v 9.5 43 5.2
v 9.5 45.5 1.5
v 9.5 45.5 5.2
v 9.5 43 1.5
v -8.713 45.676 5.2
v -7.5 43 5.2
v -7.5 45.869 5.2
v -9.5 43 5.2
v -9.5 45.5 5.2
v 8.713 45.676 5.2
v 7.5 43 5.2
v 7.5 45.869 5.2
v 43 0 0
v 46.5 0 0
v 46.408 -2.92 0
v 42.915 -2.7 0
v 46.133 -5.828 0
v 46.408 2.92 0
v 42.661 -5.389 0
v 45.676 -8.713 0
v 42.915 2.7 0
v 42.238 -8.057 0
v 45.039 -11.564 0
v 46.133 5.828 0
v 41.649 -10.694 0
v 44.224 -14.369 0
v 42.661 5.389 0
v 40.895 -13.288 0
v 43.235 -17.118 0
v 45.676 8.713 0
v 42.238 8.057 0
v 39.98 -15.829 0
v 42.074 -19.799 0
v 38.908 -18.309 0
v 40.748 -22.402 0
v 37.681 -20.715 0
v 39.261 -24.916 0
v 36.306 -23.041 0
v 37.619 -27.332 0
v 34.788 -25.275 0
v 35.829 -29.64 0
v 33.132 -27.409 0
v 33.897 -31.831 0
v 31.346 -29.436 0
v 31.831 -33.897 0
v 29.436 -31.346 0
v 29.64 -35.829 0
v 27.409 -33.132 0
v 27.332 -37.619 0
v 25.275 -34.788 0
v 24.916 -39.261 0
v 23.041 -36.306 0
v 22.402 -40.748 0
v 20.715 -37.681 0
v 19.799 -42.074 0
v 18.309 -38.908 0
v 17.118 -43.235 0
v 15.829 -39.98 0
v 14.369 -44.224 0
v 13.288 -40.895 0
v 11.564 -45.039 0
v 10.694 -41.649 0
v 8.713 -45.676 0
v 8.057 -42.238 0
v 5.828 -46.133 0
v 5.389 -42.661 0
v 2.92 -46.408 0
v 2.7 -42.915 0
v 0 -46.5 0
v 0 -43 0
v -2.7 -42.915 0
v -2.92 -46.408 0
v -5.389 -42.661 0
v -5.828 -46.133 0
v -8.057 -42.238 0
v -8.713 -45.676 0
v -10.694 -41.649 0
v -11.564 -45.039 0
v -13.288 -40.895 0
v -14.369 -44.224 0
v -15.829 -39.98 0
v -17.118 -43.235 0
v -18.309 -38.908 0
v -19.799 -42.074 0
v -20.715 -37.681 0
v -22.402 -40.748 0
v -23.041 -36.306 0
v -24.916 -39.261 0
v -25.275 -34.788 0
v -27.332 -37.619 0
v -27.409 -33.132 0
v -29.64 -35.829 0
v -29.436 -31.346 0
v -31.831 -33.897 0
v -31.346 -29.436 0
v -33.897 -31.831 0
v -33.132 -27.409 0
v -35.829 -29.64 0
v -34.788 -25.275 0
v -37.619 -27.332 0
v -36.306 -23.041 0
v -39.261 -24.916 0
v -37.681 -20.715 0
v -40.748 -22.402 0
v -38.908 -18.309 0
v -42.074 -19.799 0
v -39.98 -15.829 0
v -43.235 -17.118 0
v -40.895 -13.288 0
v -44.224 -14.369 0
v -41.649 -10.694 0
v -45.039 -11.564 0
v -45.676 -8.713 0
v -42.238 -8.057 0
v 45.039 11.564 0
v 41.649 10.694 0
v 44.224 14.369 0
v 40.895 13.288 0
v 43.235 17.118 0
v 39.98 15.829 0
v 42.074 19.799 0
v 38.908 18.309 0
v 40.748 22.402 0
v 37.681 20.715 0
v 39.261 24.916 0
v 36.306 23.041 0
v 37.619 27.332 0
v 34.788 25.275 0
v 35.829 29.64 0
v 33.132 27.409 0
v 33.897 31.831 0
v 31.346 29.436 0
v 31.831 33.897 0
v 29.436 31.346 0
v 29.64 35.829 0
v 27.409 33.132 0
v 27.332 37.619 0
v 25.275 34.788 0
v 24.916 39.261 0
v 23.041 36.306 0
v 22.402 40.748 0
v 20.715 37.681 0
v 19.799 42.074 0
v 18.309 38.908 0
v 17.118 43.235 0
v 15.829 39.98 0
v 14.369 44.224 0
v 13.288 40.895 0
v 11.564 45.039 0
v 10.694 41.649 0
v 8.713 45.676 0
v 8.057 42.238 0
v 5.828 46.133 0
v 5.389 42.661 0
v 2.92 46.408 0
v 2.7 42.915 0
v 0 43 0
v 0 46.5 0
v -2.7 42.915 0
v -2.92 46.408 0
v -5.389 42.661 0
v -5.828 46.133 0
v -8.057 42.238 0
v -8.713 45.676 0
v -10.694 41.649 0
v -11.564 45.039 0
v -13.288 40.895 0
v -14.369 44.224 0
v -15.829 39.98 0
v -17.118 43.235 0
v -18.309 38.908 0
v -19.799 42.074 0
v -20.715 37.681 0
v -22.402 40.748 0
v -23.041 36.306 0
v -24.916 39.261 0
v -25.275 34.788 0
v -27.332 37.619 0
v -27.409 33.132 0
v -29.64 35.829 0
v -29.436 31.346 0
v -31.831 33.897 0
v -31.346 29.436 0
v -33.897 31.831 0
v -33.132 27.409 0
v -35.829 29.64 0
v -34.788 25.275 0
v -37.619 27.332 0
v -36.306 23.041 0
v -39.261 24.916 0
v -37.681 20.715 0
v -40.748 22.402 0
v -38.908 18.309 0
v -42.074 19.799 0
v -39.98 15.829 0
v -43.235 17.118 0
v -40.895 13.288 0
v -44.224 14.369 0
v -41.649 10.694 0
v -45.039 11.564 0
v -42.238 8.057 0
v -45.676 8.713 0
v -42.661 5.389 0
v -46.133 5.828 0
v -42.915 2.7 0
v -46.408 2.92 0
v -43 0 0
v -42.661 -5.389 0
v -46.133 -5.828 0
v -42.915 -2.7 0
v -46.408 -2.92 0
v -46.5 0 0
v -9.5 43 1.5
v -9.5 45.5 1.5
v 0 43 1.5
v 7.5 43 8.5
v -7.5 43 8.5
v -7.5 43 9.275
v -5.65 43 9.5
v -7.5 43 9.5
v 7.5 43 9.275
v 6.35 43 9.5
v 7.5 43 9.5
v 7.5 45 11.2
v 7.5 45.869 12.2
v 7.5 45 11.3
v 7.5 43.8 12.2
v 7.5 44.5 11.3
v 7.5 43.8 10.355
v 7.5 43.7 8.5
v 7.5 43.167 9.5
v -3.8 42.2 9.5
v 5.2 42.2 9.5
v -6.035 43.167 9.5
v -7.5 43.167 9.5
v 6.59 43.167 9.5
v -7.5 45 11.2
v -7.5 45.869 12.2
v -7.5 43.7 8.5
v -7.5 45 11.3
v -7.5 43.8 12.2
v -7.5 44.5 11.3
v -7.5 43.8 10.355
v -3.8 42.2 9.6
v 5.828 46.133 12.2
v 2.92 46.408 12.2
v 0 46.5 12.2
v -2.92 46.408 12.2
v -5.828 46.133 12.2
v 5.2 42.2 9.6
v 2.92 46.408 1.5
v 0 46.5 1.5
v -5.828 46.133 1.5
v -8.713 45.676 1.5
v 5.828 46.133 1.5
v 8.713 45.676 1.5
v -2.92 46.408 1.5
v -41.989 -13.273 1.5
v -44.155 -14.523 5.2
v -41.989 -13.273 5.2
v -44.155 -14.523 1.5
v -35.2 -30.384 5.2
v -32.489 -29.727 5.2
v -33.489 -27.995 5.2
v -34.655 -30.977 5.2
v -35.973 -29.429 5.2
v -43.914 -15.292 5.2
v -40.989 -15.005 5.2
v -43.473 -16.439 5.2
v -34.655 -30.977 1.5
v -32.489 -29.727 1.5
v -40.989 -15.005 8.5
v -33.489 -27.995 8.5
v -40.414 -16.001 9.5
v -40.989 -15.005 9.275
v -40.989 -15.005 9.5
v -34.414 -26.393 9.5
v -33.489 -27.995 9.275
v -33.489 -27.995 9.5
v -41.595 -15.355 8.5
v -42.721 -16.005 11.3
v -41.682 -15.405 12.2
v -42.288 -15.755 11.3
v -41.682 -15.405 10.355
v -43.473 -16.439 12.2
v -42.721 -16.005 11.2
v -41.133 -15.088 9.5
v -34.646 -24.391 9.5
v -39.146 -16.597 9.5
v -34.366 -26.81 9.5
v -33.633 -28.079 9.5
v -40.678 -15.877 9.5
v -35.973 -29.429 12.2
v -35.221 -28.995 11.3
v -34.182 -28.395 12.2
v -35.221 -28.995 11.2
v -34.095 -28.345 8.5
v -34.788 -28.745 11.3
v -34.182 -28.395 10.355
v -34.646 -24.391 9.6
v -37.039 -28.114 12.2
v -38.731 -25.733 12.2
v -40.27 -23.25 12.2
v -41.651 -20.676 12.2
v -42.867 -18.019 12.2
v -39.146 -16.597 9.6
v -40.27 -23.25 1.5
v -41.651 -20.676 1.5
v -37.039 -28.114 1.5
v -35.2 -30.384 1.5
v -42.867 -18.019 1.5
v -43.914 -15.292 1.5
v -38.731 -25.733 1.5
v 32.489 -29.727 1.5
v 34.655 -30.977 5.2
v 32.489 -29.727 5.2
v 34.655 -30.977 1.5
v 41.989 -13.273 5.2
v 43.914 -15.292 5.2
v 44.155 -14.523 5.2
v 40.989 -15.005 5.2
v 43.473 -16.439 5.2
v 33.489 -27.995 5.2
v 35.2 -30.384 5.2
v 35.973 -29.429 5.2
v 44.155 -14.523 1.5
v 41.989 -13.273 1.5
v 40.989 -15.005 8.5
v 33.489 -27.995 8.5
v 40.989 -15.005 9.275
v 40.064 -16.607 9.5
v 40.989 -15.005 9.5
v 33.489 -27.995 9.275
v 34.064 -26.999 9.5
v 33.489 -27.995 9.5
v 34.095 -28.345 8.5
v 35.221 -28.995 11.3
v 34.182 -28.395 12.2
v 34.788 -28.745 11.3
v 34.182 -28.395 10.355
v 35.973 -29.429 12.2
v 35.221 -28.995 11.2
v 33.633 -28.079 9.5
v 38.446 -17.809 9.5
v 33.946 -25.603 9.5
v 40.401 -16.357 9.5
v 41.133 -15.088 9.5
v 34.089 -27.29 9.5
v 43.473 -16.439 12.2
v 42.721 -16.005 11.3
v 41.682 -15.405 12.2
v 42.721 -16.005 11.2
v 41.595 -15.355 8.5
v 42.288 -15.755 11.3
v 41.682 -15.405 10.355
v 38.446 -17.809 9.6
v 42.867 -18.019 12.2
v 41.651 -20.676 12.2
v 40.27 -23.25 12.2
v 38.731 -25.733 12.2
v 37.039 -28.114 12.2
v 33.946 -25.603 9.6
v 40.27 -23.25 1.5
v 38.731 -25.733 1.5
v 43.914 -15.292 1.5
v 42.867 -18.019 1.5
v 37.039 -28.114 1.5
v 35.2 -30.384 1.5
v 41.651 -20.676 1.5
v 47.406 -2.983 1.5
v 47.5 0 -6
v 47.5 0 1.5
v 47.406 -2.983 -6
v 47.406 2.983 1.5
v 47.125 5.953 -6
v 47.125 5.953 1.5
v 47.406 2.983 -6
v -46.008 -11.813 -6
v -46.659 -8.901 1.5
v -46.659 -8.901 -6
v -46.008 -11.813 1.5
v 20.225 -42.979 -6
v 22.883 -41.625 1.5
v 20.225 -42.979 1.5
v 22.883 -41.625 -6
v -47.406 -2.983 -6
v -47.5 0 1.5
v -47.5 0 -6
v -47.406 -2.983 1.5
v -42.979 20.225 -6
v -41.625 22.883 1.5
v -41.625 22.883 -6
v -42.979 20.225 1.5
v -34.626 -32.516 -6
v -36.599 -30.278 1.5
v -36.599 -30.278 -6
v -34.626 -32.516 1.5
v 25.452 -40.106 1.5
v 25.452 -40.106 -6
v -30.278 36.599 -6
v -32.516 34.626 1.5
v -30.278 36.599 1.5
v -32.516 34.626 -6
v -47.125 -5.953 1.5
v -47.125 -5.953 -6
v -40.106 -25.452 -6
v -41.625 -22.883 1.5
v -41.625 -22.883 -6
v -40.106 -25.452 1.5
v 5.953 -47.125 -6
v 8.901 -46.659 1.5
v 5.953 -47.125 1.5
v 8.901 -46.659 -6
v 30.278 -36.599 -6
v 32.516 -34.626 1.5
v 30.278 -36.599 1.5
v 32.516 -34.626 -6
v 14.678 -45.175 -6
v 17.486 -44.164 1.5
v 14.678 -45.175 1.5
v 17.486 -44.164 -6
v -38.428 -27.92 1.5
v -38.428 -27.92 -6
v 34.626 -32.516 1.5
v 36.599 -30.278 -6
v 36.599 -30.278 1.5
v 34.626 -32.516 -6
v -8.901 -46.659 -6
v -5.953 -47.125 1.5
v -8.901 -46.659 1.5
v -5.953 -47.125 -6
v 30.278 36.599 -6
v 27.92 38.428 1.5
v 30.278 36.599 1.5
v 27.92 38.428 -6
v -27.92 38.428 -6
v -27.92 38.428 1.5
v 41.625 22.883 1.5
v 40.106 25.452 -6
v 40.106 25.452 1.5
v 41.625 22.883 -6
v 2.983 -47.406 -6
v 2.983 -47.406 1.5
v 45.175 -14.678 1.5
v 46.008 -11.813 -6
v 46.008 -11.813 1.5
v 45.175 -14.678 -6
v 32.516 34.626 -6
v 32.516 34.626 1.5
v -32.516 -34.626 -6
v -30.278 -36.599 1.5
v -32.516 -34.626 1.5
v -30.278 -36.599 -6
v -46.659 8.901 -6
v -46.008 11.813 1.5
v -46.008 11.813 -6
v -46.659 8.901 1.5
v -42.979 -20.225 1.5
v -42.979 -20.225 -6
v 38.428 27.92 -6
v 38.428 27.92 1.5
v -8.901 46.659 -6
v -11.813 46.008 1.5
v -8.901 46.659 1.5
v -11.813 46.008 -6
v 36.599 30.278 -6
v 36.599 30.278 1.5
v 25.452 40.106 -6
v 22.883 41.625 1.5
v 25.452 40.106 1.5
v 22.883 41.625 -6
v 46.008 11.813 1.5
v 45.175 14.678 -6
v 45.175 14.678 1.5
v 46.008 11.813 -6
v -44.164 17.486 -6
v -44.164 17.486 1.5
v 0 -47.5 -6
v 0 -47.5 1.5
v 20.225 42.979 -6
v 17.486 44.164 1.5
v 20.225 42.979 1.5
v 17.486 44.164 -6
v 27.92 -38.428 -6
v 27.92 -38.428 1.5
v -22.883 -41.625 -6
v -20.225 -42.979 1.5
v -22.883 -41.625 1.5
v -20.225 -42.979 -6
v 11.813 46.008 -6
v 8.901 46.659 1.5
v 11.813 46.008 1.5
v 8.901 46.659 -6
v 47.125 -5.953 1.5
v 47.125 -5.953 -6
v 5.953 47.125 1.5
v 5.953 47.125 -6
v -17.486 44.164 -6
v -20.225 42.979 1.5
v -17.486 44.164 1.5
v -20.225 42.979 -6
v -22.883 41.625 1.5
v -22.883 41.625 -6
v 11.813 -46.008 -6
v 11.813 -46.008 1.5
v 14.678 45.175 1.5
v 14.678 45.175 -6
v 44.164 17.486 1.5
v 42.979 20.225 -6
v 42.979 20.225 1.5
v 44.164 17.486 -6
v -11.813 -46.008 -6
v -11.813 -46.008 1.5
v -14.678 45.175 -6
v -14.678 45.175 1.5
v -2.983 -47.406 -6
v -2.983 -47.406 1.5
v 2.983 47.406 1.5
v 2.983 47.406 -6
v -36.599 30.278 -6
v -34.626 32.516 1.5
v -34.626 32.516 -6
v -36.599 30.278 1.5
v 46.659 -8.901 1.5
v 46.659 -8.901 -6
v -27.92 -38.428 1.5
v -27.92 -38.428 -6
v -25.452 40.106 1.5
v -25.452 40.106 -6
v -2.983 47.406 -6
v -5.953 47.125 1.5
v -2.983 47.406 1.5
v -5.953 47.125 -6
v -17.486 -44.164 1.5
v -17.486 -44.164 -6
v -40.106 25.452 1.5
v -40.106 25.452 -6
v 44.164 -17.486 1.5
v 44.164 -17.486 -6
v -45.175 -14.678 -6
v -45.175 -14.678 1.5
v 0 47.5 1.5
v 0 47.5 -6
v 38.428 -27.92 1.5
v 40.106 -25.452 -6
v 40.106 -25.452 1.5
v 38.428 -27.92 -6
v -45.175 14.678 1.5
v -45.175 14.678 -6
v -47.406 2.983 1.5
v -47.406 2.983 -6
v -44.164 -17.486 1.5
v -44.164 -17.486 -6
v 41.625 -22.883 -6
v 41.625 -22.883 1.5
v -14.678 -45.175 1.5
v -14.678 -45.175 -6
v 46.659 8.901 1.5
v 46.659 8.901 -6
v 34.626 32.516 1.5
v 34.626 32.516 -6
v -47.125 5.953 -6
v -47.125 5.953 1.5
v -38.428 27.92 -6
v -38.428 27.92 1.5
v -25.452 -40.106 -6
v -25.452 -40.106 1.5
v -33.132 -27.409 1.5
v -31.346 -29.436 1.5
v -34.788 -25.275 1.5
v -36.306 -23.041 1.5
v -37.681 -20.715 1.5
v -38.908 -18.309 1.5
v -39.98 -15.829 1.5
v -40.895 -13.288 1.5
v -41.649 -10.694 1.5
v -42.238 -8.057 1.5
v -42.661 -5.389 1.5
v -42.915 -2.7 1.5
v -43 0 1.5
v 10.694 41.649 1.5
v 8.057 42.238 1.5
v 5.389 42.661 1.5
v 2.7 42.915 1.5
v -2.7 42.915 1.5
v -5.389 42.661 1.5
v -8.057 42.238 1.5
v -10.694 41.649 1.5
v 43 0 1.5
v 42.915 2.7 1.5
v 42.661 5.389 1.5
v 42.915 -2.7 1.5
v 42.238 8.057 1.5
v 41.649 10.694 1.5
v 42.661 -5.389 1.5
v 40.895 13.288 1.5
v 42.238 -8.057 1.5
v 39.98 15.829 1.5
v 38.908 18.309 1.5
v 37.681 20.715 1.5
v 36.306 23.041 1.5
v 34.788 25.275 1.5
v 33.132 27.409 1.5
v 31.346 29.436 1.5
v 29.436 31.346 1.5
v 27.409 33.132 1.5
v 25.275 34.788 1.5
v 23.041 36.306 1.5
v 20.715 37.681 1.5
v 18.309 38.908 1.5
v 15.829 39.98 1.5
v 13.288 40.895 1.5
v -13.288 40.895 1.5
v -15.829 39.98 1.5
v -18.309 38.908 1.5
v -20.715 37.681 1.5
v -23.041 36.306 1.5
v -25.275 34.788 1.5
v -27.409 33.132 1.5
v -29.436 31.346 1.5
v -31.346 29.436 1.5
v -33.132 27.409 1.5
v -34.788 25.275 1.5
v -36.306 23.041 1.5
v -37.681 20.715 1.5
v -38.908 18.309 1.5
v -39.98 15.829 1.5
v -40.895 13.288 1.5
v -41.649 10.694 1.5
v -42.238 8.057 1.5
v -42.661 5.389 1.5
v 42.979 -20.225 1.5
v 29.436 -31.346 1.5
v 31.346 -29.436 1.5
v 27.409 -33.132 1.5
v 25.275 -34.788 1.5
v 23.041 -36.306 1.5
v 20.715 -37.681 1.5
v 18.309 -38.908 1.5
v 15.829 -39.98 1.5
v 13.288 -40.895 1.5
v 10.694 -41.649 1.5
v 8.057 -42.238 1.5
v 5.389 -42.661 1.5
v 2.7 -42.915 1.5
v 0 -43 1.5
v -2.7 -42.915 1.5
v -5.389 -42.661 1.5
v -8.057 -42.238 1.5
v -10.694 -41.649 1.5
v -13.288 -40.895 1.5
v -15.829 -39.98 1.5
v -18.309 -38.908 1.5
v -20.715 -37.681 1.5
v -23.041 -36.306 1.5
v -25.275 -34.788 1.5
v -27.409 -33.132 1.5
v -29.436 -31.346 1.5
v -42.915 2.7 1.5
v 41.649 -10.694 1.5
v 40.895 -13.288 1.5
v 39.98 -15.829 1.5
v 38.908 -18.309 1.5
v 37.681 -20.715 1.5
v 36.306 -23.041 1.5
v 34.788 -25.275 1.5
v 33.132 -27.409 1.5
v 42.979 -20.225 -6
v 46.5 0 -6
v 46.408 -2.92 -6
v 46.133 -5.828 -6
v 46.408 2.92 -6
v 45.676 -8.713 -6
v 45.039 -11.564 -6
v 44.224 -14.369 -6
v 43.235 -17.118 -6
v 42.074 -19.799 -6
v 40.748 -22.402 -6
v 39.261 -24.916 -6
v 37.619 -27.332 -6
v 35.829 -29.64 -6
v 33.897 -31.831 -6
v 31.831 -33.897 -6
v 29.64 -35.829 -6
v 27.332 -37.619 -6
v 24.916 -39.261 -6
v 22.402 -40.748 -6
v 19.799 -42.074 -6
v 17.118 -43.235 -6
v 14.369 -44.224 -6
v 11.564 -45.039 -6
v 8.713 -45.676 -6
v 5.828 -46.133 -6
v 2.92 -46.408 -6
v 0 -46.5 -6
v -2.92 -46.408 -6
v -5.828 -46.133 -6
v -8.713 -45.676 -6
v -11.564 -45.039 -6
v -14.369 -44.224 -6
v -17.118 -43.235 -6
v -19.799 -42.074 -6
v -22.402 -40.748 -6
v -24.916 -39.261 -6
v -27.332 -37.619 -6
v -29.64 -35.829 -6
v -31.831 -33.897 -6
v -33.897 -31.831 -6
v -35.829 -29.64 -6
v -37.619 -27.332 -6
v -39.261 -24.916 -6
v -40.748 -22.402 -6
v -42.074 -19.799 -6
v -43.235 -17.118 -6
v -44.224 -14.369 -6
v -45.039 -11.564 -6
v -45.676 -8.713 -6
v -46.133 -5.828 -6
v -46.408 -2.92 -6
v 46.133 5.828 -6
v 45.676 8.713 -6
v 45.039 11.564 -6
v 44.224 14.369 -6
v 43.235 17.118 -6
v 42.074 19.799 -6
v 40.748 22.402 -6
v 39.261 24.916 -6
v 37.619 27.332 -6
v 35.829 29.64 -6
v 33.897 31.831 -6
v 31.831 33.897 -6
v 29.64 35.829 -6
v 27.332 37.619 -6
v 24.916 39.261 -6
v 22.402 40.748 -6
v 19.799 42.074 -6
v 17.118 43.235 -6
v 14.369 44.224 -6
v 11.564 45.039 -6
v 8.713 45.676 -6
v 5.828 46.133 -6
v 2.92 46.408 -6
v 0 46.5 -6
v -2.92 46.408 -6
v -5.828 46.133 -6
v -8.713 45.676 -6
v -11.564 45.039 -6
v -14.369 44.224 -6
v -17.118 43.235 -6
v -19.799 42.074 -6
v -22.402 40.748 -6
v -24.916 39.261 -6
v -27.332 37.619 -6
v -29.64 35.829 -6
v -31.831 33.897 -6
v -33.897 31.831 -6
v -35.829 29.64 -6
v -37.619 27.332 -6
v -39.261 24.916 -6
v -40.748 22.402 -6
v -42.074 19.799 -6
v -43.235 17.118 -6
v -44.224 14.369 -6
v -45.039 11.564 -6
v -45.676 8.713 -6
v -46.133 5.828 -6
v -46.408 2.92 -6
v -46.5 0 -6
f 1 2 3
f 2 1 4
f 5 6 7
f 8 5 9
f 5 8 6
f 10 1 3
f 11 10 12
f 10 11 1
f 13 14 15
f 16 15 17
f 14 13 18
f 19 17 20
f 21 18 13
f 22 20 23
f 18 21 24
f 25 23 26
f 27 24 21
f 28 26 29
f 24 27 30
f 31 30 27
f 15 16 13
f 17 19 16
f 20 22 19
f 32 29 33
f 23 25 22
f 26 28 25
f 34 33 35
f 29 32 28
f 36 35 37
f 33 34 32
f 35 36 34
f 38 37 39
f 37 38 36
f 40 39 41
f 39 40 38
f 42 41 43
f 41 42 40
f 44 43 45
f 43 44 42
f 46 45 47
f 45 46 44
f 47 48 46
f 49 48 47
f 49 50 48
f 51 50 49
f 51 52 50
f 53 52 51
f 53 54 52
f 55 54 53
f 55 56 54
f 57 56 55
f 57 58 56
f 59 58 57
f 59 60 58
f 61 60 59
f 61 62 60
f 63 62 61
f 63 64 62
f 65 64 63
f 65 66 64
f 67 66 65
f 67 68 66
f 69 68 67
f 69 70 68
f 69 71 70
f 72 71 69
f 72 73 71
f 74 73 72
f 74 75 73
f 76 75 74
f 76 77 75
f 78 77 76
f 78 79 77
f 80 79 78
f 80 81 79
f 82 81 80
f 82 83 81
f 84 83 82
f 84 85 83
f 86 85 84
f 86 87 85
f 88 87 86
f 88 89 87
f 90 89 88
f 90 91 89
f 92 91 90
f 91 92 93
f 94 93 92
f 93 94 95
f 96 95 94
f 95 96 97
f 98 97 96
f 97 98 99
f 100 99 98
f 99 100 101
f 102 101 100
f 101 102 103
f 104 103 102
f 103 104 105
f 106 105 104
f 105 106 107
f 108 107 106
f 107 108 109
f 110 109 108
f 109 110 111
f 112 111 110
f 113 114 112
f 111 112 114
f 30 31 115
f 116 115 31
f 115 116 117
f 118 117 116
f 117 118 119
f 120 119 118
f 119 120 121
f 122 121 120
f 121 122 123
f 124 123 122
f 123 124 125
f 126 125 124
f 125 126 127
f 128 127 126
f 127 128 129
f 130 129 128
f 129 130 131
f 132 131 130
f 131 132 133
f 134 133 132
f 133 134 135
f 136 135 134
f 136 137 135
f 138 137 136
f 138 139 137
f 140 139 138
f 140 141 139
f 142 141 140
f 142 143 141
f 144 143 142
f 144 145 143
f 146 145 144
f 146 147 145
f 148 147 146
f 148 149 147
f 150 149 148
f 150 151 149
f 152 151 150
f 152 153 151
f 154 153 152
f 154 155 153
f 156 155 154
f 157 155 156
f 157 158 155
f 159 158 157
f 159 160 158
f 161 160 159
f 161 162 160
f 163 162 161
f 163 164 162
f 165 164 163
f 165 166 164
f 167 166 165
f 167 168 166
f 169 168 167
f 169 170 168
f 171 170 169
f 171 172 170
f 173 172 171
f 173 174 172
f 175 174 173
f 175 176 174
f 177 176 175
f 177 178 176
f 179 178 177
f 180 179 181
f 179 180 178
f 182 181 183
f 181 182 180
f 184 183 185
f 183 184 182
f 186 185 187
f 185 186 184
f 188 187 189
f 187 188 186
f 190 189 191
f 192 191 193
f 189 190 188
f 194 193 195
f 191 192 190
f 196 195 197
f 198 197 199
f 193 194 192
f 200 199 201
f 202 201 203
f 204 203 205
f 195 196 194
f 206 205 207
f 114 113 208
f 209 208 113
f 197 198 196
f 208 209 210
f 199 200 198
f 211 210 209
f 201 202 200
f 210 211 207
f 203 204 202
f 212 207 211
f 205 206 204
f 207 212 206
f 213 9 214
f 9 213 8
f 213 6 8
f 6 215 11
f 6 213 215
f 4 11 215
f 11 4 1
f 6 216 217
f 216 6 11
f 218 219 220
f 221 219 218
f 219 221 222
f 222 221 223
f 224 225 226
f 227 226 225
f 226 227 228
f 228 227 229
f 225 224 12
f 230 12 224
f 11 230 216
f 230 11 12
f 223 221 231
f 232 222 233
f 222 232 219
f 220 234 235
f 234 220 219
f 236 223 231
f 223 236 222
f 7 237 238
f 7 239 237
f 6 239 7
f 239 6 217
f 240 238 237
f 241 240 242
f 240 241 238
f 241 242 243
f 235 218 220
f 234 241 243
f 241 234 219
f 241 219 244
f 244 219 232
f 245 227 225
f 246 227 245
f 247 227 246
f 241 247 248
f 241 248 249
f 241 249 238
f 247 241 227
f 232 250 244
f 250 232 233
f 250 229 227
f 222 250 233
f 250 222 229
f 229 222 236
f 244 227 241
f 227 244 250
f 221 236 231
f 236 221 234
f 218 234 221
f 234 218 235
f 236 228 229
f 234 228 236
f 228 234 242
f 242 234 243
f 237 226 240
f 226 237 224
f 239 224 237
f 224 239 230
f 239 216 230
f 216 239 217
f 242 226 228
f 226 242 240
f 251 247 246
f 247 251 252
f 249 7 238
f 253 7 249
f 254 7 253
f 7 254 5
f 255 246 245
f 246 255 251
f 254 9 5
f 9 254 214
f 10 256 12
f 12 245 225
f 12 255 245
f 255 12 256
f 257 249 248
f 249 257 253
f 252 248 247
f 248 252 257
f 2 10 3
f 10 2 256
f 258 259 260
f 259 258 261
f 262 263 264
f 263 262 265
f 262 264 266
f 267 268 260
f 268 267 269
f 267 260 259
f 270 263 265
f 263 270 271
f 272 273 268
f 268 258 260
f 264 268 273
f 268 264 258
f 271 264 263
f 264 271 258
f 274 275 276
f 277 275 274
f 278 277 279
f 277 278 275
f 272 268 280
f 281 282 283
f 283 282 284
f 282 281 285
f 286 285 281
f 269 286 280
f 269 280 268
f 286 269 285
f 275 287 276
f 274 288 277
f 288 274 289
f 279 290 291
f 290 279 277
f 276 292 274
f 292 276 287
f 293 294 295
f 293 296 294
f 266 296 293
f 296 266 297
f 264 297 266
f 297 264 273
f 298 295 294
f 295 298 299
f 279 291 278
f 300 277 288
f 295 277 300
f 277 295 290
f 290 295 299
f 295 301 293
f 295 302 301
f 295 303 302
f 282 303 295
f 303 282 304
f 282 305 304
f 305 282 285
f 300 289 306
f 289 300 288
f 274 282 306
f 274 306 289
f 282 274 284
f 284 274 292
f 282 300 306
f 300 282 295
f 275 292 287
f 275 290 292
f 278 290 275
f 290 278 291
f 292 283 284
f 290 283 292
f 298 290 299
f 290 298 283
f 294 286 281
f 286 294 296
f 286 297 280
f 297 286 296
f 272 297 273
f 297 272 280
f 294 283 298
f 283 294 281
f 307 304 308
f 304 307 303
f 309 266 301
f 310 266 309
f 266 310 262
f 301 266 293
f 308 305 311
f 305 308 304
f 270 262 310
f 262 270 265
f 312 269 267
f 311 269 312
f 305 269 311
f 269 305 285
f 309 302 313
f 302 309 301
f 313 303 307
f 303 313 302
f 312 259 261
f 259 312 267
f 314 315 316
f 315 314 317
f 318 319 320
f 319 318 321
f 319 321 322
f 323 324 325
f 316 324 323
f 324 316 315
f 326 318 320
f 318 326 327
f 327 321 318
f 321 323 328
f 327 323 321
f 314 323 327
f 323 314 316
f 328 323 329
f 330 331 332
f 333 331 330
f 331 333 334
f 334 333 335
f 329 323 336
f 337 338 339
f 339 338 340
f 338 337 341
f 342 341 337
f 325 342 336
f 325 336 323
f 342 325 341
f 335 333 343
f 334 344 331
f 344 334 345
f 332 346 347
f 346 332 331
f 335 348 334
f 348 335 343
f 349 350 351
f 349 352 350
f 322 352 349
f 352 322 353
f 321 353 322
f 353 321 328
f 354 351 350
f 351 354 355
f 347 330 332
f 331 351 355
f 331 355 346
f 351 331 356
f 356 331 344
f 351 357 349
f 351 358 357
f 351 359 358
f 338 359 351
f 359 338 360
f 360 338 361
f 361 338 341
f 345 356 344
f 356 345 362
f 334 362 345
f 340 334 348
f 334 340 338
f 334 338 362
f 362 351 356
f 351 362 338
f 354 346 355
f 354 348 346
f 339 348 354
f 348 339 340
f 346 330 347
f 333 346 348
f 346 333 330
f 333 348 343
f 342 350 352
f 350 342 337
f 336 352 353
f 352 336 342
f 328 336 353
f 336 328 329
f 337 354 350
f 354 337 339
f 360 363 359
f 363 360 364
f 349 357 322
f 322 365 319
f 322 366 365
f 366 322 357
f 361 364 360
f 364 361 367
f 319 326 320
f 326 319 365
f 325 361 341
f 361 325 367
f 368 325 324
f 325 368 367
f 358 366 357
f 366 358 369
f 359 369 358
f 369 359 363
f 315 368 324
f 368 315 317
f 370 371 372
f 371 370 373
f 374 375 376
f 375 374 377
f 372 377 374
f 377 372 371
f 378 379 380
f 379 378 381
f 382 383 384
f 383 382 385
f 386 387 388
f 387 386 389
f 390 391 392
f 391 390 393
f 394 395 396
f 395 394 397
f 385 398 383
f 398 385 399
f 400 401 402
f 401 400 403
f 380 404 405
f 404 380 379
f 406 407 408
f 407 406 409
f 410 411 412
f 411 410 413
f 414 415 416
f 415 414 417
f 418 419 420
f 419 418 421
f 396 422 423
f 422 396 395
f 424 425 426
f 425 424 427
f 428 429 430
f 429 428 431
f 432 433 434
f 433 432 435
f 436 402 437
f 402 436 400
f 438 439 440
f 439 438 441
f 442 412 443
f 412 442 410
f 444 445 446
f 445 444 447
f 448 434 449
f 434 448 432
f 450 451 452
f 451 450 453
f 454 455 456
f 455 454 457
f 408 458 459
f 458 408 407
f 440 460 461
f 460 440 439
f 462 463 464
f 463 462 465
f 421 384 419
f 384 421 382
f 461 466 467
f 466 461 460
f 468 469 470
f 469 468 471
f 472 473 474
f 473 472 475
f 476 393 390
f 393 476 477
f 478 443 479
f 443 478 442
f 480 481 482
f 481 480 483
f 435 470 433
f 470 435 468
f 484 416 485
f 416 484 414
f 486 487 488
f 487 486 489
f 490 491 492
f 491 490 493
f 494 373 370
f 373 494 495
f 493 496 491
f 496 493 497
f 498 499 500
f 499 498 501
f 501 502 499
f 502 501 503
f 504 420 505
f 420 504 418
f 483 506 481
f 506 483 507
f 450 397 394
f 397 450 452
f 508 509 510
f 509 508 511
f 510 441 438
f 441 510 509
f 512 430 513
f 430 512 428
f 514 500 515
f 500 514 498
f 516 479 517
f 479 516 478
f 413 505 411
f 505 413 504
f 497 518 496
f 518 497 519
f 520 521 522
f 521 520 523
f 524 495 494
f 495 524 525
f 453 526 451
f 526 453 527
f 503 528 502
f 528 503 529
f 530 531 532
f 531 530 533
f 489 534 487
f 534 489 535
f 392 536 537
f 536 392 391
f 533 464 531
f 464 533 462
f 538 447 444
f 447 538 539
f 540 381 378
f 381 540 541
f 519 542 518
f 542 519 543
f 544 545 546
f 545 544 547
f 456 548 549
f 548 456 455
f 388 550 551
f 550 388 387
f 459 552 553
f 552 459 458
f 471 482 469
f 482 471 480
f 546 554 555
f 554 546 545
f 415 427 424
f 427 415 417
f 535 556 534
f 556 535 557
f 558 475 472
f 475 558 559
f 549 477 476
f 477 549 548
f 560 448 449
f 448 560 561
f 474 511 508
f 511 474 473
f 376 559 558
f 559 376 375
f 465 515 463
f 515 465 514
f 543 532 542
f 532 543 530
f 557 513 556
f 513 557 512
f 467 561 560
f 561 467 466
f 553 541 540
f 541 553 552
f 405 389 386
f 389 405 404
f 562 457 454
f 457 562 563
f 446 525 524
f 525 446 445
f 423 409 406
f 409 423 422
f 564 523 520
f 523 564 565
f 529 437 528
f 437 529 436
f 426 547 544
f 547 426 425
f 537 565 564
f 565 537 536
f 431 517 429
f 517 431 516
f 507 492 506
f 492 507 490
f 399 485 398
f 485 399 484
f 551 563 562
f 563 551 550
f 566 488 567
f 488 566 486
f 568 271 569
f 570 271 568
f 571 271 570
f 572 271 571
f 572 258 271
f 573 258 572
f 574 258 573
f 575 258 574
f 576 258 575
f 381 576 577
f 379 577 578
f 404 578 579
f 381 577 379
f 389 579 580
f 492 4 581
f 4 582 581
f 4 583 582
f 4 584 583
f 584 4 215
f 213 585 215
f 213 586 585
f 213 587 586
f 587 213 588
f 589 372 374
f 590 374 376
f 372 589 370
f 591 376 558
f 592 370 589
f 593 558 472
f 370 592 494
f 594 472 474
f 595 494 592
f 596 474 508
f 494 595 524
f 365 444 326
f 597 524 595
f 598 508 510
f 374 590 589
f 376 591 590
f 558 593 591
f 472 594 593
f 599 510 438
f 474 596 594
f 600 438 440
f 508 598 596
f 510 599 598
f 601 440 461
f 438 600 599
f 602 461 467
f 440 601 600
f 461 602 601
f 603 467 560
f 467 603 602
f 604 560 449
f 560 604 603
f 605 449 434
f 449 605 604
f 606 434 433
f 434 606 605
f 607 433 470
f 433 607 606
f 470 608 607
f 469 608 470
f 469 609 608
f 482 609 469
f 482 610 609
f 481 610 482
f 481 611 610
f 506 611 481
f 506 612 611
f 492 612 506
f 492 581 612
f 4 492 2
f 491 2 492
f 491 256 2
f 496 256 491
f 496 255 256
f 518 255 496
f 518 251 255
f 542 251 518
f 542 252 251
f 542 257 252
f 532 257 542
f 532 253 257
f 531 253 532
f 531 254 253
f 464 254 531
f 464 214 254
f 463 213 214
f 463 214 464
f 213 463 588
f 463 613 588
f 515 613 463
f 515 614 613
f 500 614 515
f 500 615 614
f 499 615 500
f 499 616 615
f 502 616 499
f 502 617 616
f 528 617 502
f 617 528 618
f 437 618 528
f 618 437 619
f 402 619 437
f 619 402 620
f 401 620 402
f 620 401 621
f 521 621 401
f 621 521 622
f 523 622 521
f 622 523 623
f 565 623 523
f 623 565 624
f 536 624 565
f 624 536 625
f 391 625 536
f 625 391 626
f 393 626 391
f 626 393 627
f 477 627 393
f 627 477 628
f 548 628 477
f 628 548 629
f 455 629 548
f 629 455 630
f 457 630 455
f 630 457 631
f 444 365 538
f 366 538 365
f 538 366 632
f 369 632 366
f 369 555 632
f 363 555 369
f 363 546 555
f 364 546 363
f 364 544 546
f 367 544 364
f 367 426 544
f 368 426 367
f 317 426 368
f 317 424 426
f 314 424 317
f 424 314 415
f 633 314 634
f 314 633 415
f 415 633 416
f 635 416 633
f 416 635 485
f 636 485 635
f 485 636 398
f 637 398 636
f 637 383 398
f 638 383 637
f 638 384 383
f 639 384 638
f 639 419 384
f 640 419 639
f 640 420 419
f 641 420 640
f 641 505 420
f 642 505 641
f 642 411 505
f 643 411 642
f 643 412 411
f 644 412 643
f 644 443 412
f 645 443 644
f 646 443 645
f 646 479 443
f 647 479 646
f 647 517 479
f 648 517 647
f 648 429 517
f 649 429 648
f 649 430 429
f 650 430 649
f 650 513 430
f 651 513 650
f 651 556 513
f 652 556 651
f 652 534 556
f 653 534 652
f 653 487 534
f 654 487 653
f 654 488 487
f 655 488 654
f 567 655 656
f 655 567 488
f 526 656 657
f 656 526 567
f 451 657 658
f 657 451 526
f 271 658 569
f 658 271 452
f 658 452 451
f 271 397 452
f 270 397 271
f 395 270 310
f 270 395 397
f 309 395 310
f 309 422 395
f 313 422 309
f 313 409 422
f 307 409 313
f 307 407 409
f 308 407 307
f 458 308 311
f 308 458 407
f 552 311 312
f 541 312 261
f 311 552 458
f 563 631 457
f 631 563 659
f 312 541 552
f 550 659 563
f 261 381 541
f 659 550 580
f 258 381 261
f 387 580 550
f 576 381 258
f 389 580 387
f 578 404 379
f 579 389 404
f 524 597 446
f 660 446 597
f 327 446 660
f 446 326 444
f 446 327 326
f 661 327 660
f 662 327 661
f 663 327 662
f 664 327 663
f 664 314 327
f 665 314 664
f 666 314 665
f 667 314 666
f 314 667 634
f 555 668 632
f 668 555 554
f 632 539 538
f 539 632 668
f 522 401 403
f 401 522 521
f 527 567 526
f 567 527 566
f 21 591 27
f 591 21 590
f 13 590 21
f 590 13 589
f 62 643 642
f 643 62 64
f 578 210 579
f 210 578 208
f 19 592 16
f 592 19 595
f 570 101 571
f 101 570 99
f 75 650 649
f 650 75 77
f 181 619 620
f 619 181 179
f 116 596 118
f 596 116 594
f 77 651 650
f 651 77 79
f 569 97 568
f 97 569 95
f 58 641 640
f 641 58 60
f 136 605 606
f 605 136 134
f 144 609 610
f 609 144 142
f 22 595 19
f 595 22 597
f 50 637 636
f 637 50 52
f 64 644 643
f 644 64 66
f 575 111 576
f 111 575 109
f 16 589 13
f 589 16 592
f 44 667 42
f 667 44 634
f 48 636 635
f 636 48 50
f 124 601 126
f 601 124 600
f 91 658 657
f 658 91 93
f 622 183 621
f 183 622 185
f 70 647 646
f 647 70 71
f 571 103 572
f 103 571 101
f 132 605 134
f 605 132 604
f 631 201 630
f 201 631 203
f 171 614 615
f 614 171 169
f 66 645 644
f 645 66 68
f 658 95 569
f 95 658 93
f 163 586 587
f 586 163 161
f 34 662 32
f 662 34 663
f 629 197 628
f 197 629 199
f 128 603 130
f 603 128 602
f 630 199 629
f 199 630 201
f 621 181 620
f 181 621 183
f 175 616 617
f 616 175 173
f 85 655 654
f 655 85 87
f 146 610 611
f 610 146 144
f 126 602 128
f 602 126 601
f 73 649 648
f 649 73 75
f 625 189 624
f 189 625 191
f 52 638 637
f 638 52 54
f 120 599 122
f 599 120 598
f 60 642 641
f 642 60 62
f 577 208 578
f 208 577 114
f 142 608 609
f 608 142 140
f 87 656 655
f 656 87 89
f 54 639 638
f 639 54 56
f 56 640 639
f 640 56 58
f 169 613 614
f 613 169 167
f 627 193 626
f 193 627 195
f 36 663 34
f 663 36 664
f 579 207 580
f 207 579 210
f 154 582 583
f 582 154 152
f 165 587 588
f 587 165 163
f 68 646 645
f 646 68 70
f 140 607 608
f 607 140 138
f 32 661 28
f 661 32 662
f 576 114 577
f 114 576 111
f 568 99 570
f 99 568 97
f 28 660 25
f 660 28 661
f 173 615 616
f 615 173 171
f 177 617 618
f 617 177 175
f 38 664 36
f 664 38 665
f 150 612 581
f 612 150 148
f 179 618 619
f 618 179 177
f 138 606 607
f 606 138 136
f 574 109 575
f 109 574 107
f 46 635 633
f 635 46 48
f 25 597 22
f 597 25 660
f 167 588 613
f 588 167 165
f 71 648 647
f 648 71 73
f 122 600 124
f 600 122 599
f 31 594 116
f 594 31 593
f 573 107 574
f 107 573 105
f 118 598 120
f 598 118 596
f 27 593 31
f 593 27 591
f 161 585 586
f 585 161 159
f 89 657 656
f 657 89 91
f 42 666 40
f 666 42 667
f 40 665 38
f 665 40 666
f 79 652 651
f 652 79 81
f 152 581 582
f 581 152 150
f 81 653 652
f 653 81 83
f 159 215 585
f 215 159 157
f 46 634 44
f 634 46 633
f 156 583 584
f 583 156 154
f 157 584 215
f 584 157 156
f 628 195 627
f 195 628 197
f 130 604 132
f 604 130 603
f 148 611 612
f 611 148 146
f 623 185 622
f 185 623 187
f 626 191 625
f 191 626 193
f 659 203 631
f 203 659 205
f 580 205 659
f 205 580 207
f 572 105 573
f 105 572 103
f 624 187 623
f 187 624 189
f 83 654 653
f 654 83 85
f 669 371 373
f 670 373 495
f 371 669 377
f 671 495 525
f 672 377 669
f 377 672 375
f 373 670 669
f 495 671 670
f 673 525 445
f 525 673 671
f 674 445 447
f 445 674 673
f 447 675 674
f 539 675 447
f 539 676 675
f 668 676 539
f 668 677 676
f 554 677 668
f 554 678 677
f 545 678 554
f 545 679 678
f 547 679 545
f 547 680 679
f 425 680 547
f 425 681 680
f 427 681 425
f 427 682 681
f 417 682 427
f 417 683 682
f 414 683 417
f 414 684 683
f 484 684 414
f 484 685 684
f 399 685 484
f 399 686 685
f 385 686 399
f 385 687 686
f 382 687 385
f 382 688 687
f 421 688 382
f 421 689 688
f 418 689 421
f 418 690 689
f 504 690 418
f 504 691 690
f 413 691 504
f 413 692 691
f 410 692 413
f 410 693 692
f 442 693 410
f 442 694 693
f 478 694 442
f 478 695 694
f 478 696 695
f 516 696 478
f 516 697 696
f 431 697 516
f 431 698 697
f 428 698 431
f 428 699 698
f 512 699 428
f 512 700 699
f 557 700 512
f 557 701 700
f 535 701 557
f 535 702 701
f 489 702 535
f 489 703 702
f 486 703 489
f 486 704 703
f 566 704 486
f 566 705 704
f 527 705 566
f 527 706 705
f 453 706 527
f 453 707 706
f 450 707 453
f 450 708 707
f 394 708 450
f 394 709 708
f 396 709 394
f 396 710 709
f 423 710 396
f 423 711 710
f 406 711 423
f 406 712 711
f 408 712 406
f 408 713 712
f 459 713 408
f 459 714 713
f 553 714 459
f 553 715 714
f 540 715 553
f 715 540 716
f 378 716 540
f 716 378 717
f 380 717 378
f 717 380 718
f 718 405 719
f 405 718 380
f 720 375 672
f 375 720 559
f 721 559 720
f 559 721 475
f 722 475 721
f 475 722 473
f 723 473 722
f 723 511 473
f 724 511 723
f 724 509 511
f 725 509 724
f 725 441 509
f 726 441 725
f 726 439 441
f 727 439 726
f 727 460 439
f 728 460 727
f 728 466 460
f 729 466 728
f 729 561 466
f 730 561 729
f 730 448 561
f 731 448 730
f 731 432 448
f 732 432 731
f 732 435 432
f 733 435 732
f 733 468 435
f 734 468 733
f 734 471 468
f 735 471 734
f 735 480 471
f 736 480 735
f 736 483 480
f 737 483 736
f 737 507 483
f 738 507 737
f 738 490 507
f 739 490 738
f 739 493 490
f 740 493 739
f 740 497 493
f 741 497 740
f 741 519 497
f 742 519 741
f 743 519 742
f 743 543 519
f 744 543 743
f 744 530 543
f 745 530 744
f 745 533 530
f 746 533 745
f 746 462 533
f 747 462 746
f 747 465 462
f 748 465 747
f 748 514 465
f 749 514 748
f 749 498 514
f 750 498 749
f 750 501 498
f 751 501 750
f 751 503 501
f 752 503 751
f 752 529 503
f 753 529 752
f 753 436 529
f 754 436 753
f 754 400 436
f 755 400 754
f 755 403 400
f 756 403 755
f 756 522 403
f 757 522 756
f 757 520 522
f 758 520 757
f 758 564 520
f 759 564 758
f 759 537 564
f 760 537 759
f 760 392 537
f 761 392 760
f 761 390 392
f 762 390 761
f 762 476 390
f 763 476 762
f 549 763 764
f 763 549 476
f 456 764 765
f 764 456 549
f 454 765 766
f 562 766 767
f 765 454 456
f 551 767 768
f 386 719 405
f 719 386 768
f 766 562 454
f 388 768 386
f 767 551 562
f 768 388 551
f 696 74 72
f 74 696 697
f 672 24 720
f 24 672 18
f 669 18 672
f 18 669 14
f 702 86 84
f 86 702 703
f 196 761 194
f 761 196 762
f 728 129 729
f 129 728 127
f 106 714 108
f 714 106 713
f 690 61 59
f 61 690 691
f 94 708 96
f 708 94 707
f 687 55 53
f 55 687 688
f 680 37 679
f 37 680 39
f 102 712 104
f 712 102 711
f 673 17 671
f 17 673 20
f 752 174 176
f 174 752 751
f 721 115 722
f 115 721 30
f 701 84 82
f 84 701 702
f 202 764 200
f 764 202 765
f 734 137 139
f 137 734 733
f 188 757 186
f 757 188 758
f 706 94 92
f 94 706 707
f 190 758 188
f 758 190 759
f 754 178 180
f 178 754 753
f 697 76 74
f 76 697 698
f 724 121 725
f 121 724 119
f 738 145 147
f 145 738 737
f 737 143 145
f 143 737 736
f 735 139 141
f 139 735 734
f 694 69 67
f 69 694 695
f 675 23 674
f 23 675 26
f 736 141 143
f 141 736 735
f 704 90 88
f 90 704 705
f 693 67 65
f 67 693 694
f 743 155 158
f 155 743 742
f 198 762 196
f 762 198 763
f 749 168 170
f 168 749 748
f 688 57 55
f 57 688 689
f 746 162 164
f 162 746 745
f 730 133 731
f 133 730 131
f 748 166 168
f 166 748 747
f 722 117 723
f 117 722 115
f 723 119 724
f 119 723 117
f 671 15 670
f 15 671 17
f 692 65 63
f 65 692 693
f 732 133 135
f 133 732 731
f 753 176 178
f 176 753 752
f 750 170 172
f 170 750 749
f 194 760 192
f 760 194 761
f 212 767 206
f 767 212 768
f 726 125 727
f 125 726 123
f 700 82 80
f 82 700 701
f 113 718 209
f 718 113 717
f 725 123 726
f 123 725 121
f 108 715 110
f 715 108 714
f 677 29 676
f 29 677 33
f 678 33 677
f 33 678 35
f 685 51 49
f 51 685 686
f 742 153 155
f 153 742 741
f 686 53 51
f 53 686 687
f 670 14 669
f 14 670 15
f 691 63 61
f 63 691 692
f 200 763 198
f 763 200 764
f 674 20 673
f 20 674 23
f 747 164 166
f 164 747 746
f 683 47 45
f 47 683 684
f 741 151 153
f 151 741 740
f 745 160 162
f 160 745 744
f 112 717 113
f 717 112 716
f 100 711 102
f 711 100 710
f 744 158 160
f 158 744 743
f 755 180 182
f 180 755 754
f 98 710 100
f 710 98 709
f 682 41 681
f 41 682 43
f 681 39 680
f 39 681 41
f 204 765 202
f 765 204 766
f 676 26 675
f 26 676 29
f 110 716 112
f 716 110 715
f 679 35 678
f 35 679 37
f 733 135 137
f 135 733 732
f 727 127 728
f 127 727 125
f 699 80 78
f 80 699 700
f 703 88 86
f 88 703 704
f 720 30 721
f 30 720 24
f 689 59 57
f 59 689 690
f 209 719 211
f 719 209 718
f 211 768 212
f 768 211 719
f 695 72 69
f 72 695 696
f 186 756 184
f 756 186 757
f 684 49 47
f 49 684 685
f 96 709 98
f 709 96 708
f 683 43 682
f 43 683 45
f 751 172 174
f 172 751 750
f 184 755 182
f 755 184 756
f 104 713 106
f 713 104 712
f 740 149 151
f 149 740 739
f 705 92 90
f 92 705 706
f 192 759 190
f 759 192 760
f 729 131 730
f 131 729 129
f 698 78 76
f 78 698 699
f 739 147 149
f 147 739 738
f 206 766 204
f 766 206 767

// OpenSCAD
// file: secteur.scad
//secteur


module secteur(h,d,alpha,pas=2)
{
    c=sin(pas)*d/2;
    
    hull()
    {
        cube([.1,.1,h]);
        for(i=[0:pas:alpha])
        {
            rotate([0,0,i+pas/2]) translate([d/2-.1,-c/2,0]) cube([.1,c,h]);
        }
    }
}
// main file
// lampe V4
include <secteur.scad>

di=95.6;  // diametre intérieur tube

hf=12; // hauteur bas

hb=7;  // hauteur bouton base carte

dc=81.5;  // diametre carte

lp=15;  // largeur pied support vitre
xp=3.5;   // epaisseur pied support vitre
dp=86+2*xp;  // diametre exterieur pieds

hclip=2.7;
hp=9.5+hclip;  // hauteur pied support vitre


dv=95;  // diametre vitre
epv=1;  // epaisseur bord transversal vitre
epvf=1.5;  // epaisseur fond suport vitre vitre
hv=6;

jeu=.5;

alphaUsb=90+20-44;

//translate([0,0,hf+hb])  rotate([180,0,-22]) 
haut();

//projection(false) bas();
//translate([0,0,12]) 
//projection() 
//decoupeFond();


module haut()
{

    //  pied
    for(i=[0:1:3])
    {
        rotate([0,0,i*360/3]) intersection()
        {
            cylinder(hp,dp/2,dp/2,$fn=100);

            difference()
            {
                union()
                {
                    #translate([-lp/2-2,dp/2-xp,0]) cube([lp+4,xp,5.2]);
                    translate([-lp/2,dp/2-xp,0]) cube([lp,xp,hp-hclip]);
                    
                    hull()
                    {
                        #translate([-lp/2+3.7,dp/2-xp-.8,hp-hclip]) cube([lp-6,xp,.1]);
                        translate([-lp/2,dp/2-xp+.8,hp-hclip]) cube([lp,xp,hclip]);
                    }
                    
                }
                hull()
                {
                    translate([-lp/2,dp/2-2,hp-1]) cube([lp,.5,.1]) ;
                    translate([-lp/2,dp/2-xp-.5,hp-hclip-1]) cube([lp,1.2,.1]) ;
                }
                
           }
        }
    }

    // disque fond vitre
    translate([0,0,0]) difference()
    {
        cylinder(epvf,dv/2,dv/2,$fn=100);
        cylinder(epvf,dv/2-xp-epv,dv/2-xp-epv,$fn=100);
    }
    
    // bord vitre
    translate([0,0,-hv]) difference()
    {
        cylinder(hv,dv/2,dv/2,$fn=100);
        cylinder(hv,dv/2-epv,dv/2-epv,$fn=100);
    }
    /*
    translate([0,0,-hv]) difference()
    {
        ep=3.2;
        cylinder(hv,dv/2-ep,dv/2-ep,$fn=100);
        cylinder(hv,dv/2-epv-ep,dv/2-epv-ep,$fn=100);
        for(i=[0:1:2])
        {
            rotate([0,0,i*360/3]) translate([dv/2-5,-4.5,0]) cube([4,9,hv]);
        }
    }
    */
}

module bas()
{
difference()
{
    union()
    {
        difference()
        {
            cylinder(hf,di/2,di/2,$fn=50);
            cylinder(hf,dc/2,dc/2,$fn=50);
            
            // pieds
            for(i=[0:1:2])
            {
                rotate([0,0,i*360/3+38.5]) intersection()
                {
                    cylinder(hp,dp/2+.5,dp/2+.5,$fn=100);
                    union()
                    {
                        translate([-lp/2-.5,dp/2-xp-.5,0]) cube([lp+2,xp+1,hp+.5]);
                        #translate([-lp/2-3.8,dp/2-10,0]) cube([lp+5,10,7.5 ]);
                    }
                }
            }
            
            /*
            //evidement
            for(i=[0:1:2])
            {
                rotate([0,0,i*360/3+22.5]) secteur(hf,di-3,80);
            }
            */
            
        }
        
    // renfort prise Usb

        intersection()
        {
            cylinder(hf,di/2,di/2,$fn=50);
            rotate([0,0,alphaUsb]) translate([dc/2,-20/2,hf-10]) cube([12,20,10]);
        }

        
        // plots vis
        for(i=[0:1:2])
        {
            rotate([0,0,20+i*360/3]) plot();
        }
    }
    // trou prise usb
    rotate([0,0,alphaUsb]) hull()
    {
        //translate([di/2-4,-15/2,hf-9]) cube([5,15,8]);
        translate([di/2-4,-4,hf/2+.5]) rotate([0,90,0]) cylinder(5,4,4,$fn=20);
        translate([di/2-4,4,hf/2+.5]) rotate([0,90,0]) cylinder(5,4,4,$fn=20);
        translate([dc/2-.2,-8/2,hf-9+3.2]) cube([5,8,3]);
    }
    translate([0,0,hf-2]) cylinder(2,dc/2,dc/2,$fn=50);
}

}


module plot()
{
    l=10;
    difference()
    {
        intersection()
        {
            cylinder(hf,dc/2+1,dc/2+1,$fn=50);
            hull()
            {
               translate([-l/2,di/2-3,0])  cube([l,.1,hf]);
                translate([0,33,0])  cylinder(hf,3,3,$fn=20);                
            }   
    } 
     translate([0,32,0])  cylinder(hf,1.35,1.35,$fn=20);
     translate([0,37,0])  cylinder(hf,1.35,1.35,$fn=20);
    }
}

module decoupeFond()
{
ep=3;
    difference()
    {
        cylinder(ep,di/2,di/2,$fn=100);
        for(i=[0:1:2])
        {
            rotate([0,0,20+i*360/3]) translate([0,37,0])       cylinder(ep,2.5,2.5,$fn=100);
        }
        
         rotate([0,0,alphaUsb]) translate([-20/2,-20-15/2+2,0])  cube([20,12,ep+.1]);
         rotate([0,0,alphaUsb]) translate([0,20,0])  cylinder(ep,2,2,$fn=100);
    }
}

module decoupeVitre()
{

        cylinder(epv,dv/2-epv-jeu,dv/2-epv-jeu,$fn=200);


}
